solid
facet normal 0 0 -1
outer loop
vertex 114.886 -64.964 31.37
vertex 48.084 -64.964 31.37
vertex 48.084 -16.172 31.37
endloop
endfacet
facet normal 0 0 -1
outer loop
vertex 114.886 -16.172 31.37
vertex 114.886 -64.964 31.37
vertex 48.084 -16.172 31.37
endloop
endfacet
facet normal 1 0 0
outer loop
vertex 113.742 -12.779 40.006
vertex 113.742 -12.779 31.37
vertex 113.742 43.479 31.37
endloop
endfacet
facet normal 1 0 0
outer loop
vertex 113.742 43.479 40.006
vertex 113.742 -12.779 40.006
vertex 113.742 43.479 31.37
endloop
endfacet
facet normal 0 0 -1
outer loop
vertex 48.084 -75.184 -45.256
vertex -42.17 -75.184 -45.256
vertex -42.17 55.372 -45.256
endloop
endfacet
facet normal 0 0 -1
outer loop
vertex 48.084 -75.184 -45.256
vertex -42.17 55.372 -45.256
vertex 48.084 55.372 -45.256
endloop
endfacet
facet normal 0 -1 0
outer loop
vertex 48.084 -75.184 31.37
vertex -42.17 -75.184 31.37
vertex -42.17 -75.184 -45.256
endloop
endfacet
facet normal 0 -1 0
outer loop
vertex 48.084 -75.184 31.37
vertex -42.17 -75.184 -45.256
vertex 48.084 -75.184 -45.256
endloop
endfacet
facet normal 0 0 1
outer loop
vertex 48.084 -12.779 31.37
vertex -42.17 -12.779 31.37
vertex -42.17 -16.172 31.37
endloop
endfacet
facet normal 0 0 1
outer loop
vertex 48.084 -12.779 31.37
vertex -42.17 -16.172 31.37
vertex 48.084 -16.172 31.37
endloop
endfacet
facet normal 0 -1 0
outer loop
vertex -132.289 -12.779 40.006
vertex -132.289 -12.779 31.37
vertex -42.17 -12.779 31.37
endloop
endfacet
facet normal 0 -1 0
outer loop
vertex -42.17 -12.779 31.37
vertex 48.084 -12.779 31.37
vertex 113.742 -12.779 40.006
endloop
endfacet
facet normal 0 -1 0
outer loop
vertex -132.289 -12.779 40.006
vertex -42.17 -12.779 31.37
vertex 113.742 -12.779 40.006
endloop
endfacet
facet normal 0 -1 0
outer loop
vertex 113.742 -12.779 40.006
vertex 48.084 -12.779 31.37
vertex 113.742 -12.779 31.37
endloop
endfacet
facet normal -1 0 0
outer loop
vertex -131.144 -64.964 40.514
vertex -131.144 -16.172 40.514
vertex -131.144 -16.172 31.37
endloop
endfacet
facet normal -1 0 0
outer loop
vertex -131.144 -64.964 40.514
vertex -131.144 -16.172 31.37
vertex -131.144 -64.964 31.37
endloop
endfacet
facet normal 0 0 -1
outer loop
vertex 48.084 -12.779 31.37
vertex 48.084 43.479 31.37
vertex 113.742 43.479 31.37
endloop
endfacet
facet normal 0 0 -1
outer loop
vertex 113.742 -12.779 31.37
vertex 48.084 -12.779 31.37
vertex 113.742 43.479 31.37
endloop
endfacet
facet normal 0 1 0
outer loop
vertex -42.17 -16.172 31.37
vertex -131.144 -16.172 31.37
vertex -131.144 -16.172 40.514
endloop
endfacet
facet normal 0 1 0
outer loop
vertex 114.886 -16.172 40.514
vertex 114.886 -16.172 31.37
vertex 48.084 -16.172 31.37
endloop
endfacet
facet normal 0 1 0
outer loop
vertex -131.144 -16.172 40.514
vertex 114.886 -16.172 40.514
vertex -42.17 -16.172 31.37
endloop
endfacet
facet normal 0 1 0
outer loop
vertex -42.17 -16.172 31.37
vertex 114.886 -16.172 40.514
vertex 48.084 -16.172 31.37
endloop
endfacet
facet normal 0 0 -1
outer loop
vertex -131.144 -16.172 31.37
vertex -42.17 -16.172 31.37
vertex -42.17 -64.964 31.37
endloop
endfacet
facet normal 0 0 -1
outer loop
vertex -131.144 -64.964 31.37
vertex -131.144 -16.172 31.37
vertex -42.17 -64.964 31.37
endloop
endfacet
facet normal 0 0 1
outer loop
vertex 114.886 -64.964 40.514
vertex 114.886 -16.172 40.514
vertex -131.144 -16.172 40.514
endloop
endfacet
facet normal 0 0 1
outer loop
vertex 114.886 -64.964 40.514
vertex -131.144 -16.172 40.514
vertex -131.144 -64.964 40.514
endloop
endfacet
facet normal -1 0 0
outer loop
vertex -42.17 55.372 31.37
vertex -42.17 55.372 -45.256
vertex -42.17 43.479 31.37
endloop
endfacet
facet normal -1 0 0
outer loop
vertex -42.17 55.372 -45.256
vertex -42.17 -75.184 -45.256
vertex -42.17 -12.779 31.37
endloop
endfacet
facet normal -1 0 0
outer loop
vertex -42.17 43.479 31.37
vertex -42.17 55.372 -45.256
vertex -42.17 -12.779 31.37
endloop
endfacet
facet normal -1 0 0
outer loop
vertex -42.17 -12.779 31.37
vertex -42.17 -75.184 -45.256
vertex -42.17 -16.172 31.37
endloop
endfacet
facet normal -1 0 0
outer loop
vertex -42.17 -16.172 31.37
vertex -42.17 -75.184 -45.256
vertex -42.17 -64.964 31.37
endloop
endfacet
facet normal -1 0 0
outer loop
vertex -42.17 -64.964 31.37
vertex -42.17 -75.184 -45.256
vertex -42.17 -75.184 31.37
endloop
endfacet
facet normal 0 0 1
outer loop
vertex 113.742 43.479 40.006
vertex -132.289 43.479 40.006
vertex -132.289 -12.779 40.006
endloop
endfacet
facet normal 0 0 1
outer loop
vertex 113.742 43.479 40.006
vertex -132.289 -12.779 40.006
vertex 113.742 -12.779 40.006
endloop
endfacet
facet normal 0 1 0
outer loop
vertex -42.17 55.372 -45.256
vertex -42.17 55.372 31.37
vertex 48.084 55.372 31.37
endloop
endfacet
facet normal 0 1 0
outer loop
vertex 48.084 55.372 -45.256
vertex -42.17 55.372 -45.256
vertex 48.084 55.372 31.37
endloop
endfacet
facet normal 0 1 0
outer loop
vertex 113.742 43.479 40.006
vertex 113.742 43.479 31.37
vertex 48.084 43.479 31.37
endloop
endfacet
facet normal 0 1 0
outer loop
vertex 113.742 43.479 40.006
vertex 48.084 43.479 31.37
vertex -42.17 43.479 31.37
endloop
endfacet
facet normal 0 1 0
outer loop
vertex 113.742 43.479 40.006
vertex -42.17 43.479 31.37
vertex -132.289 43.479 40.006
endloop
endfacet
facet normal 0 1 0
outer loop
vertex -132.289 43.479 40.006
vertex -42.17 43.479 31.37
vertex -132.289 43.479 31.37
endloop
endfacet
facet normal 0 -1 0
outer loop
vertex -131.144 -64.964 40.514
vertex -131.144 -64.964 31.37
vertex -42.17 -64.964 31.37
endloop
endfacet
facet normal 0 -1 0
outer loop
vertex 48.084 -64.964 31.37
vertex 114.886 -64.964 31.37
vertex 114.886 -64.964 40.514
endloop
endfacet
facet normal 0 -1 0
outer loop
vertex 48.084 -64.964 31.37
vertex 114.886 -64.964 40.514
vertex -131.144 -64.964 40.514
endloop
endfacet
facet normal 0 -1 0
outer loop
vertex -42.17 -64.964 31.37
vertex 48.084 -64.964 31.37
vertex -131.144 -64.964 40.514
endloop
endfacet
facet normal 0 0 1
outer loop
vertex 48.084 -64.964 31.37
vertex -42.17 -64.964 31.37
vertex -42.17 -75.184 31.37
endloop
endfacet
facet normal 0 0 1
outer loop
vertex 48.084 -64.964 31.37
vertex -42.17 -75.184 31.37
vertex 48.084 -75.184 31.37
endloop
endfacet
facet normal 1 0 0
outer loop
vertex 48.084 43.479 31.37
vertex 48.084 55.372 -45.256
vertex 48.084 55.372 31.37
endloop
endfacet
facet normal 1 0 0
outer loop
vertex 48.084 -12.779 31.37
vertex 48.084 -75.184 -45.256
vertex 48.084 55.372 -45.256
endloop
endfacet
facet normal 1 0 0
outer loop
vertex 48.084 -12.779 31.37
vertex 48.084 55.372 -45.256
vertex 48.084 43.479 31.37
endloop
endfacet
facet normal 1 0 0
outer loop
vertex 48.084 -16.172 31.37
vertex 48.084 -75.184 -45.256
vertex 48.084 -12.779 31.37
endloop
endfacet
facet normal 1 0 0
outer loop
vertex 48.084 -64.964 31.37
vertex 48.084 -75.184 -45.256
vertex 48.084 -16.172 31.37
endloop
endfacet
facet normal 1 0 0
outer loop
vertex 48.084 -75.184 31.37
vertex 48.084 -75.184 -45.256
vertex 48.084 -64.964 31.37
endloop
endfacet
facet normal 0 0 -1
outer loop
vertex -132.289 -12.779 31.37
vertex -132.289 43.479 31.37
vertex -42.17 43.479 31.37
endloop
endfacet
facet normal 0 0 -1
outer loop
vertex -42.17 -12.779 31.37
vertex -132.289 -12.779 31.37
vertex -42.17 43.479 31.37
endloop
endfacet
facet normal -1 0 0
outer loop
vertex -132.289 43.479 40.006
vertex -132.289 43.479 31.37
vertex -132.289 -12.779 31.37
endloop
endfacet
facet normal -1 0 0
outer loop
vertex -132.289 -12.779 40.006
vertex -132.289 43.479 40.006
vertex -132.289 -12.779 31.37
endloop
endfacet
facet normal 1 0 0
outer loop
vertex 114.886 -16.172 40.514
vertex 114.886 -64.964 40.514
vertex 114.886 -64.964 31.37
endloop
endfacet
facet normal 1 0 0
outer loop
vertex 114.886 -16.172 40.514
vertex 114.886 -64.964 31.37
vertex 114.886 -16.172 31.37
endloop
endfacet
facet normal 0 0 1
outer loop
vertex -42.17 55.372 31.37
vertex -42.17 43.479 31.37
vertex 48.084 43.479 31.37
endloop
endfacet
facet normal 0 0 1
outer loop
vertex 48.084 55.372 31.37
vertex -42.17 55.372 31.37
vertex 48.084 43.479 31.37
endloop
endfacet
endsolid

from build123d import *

# Parameters (mm, degrees)
F0_W      = 90.2540013194
F0_H      = 76.625905931
F1_DEPTH  = 75.184
F2_W      = 87.2799269855
F2_H      = 48.7919023726
F3_DEPTH  = 9.144
F4_W      = 48.7919023726
F4_H      = 9.144
F5_DEPTH  = 66.802
F6_W      = 48.7919023726
F6_H      = 9.144
F7_DEPTH  = 91.948
F8_W      = 90.2540013194
F8_H      = 12.7788623795
F9_DEPTH  = 8.636
F10_DEPTH = 55.372


with BuildPart() as f1:
    # F0 (on Front) → F1 (new body)
    with BuildSketch(Plane.XZ):
        with Locations((2.9570385814, -6.9426186383)):
            Rectangle(F0_W, F0_H)
    extrude(amount=F1_DEPTH)

    # F2 (on face) → F3 (join)
    with BuildSketch(Plane.XY.offset(31.3703343272)):
        with Locations((4.4440757483, -40.5677921372)):
            Rectangle(F2_W, F2_H)
    extrude(amount=F3_DEPTH)

    # F4 (on face) → F5 (join)
    with BuildSketch(Plane.YZ.offset(48.0840392411)):
        with Locations((-40.5677921372, 35.9423343272)):
            Rectangle(F4_W, F4_H)
    extrude(amount=F5_DEPTH)

    # F6 (on face) → F7 (join)
    with BuildSketch(Plane(origin=(-39.1958877444, 0, 0), x_dir=(0, -1, 0), z_dir=(-1, 0, 0))):
        with Locations((40.5677921372, 35.9423343272)):
            Rectangle(F6_W, F6_H)
    extrude(amount=F7_DEPTH)

    # F8 (on face) → F9 (join)
    with BuildSketch(Plane.XY.offset(31.3703343272)):
        Polygon((-132.288813591, 43.4794910252), (-132.288813591, -12.7788623795), (-42.1699620783, -12.7788623795), (-42.1699620783, 0), (48.0840392411, 0), (48.0840392411, -12.7788623795), (113.7418448925, -12.7788623795), (113.7418448925, 43.4794910252), align=None)
        with Locations((2.9570385814, -6.3894311897)):
            Rectangle(F8_W, F8_H)
    extrude(amount=F9_DEPTH)

    # F10 (add): a face of the model
    f10_faces = [f1.faces().sort_by_distance(p)[0] for p in [
        (2.9570385814, 0, -6.9426186383),
    ]]
    extrude(f10_faces, amount=F10_DEPTH)


solid = f1.part
